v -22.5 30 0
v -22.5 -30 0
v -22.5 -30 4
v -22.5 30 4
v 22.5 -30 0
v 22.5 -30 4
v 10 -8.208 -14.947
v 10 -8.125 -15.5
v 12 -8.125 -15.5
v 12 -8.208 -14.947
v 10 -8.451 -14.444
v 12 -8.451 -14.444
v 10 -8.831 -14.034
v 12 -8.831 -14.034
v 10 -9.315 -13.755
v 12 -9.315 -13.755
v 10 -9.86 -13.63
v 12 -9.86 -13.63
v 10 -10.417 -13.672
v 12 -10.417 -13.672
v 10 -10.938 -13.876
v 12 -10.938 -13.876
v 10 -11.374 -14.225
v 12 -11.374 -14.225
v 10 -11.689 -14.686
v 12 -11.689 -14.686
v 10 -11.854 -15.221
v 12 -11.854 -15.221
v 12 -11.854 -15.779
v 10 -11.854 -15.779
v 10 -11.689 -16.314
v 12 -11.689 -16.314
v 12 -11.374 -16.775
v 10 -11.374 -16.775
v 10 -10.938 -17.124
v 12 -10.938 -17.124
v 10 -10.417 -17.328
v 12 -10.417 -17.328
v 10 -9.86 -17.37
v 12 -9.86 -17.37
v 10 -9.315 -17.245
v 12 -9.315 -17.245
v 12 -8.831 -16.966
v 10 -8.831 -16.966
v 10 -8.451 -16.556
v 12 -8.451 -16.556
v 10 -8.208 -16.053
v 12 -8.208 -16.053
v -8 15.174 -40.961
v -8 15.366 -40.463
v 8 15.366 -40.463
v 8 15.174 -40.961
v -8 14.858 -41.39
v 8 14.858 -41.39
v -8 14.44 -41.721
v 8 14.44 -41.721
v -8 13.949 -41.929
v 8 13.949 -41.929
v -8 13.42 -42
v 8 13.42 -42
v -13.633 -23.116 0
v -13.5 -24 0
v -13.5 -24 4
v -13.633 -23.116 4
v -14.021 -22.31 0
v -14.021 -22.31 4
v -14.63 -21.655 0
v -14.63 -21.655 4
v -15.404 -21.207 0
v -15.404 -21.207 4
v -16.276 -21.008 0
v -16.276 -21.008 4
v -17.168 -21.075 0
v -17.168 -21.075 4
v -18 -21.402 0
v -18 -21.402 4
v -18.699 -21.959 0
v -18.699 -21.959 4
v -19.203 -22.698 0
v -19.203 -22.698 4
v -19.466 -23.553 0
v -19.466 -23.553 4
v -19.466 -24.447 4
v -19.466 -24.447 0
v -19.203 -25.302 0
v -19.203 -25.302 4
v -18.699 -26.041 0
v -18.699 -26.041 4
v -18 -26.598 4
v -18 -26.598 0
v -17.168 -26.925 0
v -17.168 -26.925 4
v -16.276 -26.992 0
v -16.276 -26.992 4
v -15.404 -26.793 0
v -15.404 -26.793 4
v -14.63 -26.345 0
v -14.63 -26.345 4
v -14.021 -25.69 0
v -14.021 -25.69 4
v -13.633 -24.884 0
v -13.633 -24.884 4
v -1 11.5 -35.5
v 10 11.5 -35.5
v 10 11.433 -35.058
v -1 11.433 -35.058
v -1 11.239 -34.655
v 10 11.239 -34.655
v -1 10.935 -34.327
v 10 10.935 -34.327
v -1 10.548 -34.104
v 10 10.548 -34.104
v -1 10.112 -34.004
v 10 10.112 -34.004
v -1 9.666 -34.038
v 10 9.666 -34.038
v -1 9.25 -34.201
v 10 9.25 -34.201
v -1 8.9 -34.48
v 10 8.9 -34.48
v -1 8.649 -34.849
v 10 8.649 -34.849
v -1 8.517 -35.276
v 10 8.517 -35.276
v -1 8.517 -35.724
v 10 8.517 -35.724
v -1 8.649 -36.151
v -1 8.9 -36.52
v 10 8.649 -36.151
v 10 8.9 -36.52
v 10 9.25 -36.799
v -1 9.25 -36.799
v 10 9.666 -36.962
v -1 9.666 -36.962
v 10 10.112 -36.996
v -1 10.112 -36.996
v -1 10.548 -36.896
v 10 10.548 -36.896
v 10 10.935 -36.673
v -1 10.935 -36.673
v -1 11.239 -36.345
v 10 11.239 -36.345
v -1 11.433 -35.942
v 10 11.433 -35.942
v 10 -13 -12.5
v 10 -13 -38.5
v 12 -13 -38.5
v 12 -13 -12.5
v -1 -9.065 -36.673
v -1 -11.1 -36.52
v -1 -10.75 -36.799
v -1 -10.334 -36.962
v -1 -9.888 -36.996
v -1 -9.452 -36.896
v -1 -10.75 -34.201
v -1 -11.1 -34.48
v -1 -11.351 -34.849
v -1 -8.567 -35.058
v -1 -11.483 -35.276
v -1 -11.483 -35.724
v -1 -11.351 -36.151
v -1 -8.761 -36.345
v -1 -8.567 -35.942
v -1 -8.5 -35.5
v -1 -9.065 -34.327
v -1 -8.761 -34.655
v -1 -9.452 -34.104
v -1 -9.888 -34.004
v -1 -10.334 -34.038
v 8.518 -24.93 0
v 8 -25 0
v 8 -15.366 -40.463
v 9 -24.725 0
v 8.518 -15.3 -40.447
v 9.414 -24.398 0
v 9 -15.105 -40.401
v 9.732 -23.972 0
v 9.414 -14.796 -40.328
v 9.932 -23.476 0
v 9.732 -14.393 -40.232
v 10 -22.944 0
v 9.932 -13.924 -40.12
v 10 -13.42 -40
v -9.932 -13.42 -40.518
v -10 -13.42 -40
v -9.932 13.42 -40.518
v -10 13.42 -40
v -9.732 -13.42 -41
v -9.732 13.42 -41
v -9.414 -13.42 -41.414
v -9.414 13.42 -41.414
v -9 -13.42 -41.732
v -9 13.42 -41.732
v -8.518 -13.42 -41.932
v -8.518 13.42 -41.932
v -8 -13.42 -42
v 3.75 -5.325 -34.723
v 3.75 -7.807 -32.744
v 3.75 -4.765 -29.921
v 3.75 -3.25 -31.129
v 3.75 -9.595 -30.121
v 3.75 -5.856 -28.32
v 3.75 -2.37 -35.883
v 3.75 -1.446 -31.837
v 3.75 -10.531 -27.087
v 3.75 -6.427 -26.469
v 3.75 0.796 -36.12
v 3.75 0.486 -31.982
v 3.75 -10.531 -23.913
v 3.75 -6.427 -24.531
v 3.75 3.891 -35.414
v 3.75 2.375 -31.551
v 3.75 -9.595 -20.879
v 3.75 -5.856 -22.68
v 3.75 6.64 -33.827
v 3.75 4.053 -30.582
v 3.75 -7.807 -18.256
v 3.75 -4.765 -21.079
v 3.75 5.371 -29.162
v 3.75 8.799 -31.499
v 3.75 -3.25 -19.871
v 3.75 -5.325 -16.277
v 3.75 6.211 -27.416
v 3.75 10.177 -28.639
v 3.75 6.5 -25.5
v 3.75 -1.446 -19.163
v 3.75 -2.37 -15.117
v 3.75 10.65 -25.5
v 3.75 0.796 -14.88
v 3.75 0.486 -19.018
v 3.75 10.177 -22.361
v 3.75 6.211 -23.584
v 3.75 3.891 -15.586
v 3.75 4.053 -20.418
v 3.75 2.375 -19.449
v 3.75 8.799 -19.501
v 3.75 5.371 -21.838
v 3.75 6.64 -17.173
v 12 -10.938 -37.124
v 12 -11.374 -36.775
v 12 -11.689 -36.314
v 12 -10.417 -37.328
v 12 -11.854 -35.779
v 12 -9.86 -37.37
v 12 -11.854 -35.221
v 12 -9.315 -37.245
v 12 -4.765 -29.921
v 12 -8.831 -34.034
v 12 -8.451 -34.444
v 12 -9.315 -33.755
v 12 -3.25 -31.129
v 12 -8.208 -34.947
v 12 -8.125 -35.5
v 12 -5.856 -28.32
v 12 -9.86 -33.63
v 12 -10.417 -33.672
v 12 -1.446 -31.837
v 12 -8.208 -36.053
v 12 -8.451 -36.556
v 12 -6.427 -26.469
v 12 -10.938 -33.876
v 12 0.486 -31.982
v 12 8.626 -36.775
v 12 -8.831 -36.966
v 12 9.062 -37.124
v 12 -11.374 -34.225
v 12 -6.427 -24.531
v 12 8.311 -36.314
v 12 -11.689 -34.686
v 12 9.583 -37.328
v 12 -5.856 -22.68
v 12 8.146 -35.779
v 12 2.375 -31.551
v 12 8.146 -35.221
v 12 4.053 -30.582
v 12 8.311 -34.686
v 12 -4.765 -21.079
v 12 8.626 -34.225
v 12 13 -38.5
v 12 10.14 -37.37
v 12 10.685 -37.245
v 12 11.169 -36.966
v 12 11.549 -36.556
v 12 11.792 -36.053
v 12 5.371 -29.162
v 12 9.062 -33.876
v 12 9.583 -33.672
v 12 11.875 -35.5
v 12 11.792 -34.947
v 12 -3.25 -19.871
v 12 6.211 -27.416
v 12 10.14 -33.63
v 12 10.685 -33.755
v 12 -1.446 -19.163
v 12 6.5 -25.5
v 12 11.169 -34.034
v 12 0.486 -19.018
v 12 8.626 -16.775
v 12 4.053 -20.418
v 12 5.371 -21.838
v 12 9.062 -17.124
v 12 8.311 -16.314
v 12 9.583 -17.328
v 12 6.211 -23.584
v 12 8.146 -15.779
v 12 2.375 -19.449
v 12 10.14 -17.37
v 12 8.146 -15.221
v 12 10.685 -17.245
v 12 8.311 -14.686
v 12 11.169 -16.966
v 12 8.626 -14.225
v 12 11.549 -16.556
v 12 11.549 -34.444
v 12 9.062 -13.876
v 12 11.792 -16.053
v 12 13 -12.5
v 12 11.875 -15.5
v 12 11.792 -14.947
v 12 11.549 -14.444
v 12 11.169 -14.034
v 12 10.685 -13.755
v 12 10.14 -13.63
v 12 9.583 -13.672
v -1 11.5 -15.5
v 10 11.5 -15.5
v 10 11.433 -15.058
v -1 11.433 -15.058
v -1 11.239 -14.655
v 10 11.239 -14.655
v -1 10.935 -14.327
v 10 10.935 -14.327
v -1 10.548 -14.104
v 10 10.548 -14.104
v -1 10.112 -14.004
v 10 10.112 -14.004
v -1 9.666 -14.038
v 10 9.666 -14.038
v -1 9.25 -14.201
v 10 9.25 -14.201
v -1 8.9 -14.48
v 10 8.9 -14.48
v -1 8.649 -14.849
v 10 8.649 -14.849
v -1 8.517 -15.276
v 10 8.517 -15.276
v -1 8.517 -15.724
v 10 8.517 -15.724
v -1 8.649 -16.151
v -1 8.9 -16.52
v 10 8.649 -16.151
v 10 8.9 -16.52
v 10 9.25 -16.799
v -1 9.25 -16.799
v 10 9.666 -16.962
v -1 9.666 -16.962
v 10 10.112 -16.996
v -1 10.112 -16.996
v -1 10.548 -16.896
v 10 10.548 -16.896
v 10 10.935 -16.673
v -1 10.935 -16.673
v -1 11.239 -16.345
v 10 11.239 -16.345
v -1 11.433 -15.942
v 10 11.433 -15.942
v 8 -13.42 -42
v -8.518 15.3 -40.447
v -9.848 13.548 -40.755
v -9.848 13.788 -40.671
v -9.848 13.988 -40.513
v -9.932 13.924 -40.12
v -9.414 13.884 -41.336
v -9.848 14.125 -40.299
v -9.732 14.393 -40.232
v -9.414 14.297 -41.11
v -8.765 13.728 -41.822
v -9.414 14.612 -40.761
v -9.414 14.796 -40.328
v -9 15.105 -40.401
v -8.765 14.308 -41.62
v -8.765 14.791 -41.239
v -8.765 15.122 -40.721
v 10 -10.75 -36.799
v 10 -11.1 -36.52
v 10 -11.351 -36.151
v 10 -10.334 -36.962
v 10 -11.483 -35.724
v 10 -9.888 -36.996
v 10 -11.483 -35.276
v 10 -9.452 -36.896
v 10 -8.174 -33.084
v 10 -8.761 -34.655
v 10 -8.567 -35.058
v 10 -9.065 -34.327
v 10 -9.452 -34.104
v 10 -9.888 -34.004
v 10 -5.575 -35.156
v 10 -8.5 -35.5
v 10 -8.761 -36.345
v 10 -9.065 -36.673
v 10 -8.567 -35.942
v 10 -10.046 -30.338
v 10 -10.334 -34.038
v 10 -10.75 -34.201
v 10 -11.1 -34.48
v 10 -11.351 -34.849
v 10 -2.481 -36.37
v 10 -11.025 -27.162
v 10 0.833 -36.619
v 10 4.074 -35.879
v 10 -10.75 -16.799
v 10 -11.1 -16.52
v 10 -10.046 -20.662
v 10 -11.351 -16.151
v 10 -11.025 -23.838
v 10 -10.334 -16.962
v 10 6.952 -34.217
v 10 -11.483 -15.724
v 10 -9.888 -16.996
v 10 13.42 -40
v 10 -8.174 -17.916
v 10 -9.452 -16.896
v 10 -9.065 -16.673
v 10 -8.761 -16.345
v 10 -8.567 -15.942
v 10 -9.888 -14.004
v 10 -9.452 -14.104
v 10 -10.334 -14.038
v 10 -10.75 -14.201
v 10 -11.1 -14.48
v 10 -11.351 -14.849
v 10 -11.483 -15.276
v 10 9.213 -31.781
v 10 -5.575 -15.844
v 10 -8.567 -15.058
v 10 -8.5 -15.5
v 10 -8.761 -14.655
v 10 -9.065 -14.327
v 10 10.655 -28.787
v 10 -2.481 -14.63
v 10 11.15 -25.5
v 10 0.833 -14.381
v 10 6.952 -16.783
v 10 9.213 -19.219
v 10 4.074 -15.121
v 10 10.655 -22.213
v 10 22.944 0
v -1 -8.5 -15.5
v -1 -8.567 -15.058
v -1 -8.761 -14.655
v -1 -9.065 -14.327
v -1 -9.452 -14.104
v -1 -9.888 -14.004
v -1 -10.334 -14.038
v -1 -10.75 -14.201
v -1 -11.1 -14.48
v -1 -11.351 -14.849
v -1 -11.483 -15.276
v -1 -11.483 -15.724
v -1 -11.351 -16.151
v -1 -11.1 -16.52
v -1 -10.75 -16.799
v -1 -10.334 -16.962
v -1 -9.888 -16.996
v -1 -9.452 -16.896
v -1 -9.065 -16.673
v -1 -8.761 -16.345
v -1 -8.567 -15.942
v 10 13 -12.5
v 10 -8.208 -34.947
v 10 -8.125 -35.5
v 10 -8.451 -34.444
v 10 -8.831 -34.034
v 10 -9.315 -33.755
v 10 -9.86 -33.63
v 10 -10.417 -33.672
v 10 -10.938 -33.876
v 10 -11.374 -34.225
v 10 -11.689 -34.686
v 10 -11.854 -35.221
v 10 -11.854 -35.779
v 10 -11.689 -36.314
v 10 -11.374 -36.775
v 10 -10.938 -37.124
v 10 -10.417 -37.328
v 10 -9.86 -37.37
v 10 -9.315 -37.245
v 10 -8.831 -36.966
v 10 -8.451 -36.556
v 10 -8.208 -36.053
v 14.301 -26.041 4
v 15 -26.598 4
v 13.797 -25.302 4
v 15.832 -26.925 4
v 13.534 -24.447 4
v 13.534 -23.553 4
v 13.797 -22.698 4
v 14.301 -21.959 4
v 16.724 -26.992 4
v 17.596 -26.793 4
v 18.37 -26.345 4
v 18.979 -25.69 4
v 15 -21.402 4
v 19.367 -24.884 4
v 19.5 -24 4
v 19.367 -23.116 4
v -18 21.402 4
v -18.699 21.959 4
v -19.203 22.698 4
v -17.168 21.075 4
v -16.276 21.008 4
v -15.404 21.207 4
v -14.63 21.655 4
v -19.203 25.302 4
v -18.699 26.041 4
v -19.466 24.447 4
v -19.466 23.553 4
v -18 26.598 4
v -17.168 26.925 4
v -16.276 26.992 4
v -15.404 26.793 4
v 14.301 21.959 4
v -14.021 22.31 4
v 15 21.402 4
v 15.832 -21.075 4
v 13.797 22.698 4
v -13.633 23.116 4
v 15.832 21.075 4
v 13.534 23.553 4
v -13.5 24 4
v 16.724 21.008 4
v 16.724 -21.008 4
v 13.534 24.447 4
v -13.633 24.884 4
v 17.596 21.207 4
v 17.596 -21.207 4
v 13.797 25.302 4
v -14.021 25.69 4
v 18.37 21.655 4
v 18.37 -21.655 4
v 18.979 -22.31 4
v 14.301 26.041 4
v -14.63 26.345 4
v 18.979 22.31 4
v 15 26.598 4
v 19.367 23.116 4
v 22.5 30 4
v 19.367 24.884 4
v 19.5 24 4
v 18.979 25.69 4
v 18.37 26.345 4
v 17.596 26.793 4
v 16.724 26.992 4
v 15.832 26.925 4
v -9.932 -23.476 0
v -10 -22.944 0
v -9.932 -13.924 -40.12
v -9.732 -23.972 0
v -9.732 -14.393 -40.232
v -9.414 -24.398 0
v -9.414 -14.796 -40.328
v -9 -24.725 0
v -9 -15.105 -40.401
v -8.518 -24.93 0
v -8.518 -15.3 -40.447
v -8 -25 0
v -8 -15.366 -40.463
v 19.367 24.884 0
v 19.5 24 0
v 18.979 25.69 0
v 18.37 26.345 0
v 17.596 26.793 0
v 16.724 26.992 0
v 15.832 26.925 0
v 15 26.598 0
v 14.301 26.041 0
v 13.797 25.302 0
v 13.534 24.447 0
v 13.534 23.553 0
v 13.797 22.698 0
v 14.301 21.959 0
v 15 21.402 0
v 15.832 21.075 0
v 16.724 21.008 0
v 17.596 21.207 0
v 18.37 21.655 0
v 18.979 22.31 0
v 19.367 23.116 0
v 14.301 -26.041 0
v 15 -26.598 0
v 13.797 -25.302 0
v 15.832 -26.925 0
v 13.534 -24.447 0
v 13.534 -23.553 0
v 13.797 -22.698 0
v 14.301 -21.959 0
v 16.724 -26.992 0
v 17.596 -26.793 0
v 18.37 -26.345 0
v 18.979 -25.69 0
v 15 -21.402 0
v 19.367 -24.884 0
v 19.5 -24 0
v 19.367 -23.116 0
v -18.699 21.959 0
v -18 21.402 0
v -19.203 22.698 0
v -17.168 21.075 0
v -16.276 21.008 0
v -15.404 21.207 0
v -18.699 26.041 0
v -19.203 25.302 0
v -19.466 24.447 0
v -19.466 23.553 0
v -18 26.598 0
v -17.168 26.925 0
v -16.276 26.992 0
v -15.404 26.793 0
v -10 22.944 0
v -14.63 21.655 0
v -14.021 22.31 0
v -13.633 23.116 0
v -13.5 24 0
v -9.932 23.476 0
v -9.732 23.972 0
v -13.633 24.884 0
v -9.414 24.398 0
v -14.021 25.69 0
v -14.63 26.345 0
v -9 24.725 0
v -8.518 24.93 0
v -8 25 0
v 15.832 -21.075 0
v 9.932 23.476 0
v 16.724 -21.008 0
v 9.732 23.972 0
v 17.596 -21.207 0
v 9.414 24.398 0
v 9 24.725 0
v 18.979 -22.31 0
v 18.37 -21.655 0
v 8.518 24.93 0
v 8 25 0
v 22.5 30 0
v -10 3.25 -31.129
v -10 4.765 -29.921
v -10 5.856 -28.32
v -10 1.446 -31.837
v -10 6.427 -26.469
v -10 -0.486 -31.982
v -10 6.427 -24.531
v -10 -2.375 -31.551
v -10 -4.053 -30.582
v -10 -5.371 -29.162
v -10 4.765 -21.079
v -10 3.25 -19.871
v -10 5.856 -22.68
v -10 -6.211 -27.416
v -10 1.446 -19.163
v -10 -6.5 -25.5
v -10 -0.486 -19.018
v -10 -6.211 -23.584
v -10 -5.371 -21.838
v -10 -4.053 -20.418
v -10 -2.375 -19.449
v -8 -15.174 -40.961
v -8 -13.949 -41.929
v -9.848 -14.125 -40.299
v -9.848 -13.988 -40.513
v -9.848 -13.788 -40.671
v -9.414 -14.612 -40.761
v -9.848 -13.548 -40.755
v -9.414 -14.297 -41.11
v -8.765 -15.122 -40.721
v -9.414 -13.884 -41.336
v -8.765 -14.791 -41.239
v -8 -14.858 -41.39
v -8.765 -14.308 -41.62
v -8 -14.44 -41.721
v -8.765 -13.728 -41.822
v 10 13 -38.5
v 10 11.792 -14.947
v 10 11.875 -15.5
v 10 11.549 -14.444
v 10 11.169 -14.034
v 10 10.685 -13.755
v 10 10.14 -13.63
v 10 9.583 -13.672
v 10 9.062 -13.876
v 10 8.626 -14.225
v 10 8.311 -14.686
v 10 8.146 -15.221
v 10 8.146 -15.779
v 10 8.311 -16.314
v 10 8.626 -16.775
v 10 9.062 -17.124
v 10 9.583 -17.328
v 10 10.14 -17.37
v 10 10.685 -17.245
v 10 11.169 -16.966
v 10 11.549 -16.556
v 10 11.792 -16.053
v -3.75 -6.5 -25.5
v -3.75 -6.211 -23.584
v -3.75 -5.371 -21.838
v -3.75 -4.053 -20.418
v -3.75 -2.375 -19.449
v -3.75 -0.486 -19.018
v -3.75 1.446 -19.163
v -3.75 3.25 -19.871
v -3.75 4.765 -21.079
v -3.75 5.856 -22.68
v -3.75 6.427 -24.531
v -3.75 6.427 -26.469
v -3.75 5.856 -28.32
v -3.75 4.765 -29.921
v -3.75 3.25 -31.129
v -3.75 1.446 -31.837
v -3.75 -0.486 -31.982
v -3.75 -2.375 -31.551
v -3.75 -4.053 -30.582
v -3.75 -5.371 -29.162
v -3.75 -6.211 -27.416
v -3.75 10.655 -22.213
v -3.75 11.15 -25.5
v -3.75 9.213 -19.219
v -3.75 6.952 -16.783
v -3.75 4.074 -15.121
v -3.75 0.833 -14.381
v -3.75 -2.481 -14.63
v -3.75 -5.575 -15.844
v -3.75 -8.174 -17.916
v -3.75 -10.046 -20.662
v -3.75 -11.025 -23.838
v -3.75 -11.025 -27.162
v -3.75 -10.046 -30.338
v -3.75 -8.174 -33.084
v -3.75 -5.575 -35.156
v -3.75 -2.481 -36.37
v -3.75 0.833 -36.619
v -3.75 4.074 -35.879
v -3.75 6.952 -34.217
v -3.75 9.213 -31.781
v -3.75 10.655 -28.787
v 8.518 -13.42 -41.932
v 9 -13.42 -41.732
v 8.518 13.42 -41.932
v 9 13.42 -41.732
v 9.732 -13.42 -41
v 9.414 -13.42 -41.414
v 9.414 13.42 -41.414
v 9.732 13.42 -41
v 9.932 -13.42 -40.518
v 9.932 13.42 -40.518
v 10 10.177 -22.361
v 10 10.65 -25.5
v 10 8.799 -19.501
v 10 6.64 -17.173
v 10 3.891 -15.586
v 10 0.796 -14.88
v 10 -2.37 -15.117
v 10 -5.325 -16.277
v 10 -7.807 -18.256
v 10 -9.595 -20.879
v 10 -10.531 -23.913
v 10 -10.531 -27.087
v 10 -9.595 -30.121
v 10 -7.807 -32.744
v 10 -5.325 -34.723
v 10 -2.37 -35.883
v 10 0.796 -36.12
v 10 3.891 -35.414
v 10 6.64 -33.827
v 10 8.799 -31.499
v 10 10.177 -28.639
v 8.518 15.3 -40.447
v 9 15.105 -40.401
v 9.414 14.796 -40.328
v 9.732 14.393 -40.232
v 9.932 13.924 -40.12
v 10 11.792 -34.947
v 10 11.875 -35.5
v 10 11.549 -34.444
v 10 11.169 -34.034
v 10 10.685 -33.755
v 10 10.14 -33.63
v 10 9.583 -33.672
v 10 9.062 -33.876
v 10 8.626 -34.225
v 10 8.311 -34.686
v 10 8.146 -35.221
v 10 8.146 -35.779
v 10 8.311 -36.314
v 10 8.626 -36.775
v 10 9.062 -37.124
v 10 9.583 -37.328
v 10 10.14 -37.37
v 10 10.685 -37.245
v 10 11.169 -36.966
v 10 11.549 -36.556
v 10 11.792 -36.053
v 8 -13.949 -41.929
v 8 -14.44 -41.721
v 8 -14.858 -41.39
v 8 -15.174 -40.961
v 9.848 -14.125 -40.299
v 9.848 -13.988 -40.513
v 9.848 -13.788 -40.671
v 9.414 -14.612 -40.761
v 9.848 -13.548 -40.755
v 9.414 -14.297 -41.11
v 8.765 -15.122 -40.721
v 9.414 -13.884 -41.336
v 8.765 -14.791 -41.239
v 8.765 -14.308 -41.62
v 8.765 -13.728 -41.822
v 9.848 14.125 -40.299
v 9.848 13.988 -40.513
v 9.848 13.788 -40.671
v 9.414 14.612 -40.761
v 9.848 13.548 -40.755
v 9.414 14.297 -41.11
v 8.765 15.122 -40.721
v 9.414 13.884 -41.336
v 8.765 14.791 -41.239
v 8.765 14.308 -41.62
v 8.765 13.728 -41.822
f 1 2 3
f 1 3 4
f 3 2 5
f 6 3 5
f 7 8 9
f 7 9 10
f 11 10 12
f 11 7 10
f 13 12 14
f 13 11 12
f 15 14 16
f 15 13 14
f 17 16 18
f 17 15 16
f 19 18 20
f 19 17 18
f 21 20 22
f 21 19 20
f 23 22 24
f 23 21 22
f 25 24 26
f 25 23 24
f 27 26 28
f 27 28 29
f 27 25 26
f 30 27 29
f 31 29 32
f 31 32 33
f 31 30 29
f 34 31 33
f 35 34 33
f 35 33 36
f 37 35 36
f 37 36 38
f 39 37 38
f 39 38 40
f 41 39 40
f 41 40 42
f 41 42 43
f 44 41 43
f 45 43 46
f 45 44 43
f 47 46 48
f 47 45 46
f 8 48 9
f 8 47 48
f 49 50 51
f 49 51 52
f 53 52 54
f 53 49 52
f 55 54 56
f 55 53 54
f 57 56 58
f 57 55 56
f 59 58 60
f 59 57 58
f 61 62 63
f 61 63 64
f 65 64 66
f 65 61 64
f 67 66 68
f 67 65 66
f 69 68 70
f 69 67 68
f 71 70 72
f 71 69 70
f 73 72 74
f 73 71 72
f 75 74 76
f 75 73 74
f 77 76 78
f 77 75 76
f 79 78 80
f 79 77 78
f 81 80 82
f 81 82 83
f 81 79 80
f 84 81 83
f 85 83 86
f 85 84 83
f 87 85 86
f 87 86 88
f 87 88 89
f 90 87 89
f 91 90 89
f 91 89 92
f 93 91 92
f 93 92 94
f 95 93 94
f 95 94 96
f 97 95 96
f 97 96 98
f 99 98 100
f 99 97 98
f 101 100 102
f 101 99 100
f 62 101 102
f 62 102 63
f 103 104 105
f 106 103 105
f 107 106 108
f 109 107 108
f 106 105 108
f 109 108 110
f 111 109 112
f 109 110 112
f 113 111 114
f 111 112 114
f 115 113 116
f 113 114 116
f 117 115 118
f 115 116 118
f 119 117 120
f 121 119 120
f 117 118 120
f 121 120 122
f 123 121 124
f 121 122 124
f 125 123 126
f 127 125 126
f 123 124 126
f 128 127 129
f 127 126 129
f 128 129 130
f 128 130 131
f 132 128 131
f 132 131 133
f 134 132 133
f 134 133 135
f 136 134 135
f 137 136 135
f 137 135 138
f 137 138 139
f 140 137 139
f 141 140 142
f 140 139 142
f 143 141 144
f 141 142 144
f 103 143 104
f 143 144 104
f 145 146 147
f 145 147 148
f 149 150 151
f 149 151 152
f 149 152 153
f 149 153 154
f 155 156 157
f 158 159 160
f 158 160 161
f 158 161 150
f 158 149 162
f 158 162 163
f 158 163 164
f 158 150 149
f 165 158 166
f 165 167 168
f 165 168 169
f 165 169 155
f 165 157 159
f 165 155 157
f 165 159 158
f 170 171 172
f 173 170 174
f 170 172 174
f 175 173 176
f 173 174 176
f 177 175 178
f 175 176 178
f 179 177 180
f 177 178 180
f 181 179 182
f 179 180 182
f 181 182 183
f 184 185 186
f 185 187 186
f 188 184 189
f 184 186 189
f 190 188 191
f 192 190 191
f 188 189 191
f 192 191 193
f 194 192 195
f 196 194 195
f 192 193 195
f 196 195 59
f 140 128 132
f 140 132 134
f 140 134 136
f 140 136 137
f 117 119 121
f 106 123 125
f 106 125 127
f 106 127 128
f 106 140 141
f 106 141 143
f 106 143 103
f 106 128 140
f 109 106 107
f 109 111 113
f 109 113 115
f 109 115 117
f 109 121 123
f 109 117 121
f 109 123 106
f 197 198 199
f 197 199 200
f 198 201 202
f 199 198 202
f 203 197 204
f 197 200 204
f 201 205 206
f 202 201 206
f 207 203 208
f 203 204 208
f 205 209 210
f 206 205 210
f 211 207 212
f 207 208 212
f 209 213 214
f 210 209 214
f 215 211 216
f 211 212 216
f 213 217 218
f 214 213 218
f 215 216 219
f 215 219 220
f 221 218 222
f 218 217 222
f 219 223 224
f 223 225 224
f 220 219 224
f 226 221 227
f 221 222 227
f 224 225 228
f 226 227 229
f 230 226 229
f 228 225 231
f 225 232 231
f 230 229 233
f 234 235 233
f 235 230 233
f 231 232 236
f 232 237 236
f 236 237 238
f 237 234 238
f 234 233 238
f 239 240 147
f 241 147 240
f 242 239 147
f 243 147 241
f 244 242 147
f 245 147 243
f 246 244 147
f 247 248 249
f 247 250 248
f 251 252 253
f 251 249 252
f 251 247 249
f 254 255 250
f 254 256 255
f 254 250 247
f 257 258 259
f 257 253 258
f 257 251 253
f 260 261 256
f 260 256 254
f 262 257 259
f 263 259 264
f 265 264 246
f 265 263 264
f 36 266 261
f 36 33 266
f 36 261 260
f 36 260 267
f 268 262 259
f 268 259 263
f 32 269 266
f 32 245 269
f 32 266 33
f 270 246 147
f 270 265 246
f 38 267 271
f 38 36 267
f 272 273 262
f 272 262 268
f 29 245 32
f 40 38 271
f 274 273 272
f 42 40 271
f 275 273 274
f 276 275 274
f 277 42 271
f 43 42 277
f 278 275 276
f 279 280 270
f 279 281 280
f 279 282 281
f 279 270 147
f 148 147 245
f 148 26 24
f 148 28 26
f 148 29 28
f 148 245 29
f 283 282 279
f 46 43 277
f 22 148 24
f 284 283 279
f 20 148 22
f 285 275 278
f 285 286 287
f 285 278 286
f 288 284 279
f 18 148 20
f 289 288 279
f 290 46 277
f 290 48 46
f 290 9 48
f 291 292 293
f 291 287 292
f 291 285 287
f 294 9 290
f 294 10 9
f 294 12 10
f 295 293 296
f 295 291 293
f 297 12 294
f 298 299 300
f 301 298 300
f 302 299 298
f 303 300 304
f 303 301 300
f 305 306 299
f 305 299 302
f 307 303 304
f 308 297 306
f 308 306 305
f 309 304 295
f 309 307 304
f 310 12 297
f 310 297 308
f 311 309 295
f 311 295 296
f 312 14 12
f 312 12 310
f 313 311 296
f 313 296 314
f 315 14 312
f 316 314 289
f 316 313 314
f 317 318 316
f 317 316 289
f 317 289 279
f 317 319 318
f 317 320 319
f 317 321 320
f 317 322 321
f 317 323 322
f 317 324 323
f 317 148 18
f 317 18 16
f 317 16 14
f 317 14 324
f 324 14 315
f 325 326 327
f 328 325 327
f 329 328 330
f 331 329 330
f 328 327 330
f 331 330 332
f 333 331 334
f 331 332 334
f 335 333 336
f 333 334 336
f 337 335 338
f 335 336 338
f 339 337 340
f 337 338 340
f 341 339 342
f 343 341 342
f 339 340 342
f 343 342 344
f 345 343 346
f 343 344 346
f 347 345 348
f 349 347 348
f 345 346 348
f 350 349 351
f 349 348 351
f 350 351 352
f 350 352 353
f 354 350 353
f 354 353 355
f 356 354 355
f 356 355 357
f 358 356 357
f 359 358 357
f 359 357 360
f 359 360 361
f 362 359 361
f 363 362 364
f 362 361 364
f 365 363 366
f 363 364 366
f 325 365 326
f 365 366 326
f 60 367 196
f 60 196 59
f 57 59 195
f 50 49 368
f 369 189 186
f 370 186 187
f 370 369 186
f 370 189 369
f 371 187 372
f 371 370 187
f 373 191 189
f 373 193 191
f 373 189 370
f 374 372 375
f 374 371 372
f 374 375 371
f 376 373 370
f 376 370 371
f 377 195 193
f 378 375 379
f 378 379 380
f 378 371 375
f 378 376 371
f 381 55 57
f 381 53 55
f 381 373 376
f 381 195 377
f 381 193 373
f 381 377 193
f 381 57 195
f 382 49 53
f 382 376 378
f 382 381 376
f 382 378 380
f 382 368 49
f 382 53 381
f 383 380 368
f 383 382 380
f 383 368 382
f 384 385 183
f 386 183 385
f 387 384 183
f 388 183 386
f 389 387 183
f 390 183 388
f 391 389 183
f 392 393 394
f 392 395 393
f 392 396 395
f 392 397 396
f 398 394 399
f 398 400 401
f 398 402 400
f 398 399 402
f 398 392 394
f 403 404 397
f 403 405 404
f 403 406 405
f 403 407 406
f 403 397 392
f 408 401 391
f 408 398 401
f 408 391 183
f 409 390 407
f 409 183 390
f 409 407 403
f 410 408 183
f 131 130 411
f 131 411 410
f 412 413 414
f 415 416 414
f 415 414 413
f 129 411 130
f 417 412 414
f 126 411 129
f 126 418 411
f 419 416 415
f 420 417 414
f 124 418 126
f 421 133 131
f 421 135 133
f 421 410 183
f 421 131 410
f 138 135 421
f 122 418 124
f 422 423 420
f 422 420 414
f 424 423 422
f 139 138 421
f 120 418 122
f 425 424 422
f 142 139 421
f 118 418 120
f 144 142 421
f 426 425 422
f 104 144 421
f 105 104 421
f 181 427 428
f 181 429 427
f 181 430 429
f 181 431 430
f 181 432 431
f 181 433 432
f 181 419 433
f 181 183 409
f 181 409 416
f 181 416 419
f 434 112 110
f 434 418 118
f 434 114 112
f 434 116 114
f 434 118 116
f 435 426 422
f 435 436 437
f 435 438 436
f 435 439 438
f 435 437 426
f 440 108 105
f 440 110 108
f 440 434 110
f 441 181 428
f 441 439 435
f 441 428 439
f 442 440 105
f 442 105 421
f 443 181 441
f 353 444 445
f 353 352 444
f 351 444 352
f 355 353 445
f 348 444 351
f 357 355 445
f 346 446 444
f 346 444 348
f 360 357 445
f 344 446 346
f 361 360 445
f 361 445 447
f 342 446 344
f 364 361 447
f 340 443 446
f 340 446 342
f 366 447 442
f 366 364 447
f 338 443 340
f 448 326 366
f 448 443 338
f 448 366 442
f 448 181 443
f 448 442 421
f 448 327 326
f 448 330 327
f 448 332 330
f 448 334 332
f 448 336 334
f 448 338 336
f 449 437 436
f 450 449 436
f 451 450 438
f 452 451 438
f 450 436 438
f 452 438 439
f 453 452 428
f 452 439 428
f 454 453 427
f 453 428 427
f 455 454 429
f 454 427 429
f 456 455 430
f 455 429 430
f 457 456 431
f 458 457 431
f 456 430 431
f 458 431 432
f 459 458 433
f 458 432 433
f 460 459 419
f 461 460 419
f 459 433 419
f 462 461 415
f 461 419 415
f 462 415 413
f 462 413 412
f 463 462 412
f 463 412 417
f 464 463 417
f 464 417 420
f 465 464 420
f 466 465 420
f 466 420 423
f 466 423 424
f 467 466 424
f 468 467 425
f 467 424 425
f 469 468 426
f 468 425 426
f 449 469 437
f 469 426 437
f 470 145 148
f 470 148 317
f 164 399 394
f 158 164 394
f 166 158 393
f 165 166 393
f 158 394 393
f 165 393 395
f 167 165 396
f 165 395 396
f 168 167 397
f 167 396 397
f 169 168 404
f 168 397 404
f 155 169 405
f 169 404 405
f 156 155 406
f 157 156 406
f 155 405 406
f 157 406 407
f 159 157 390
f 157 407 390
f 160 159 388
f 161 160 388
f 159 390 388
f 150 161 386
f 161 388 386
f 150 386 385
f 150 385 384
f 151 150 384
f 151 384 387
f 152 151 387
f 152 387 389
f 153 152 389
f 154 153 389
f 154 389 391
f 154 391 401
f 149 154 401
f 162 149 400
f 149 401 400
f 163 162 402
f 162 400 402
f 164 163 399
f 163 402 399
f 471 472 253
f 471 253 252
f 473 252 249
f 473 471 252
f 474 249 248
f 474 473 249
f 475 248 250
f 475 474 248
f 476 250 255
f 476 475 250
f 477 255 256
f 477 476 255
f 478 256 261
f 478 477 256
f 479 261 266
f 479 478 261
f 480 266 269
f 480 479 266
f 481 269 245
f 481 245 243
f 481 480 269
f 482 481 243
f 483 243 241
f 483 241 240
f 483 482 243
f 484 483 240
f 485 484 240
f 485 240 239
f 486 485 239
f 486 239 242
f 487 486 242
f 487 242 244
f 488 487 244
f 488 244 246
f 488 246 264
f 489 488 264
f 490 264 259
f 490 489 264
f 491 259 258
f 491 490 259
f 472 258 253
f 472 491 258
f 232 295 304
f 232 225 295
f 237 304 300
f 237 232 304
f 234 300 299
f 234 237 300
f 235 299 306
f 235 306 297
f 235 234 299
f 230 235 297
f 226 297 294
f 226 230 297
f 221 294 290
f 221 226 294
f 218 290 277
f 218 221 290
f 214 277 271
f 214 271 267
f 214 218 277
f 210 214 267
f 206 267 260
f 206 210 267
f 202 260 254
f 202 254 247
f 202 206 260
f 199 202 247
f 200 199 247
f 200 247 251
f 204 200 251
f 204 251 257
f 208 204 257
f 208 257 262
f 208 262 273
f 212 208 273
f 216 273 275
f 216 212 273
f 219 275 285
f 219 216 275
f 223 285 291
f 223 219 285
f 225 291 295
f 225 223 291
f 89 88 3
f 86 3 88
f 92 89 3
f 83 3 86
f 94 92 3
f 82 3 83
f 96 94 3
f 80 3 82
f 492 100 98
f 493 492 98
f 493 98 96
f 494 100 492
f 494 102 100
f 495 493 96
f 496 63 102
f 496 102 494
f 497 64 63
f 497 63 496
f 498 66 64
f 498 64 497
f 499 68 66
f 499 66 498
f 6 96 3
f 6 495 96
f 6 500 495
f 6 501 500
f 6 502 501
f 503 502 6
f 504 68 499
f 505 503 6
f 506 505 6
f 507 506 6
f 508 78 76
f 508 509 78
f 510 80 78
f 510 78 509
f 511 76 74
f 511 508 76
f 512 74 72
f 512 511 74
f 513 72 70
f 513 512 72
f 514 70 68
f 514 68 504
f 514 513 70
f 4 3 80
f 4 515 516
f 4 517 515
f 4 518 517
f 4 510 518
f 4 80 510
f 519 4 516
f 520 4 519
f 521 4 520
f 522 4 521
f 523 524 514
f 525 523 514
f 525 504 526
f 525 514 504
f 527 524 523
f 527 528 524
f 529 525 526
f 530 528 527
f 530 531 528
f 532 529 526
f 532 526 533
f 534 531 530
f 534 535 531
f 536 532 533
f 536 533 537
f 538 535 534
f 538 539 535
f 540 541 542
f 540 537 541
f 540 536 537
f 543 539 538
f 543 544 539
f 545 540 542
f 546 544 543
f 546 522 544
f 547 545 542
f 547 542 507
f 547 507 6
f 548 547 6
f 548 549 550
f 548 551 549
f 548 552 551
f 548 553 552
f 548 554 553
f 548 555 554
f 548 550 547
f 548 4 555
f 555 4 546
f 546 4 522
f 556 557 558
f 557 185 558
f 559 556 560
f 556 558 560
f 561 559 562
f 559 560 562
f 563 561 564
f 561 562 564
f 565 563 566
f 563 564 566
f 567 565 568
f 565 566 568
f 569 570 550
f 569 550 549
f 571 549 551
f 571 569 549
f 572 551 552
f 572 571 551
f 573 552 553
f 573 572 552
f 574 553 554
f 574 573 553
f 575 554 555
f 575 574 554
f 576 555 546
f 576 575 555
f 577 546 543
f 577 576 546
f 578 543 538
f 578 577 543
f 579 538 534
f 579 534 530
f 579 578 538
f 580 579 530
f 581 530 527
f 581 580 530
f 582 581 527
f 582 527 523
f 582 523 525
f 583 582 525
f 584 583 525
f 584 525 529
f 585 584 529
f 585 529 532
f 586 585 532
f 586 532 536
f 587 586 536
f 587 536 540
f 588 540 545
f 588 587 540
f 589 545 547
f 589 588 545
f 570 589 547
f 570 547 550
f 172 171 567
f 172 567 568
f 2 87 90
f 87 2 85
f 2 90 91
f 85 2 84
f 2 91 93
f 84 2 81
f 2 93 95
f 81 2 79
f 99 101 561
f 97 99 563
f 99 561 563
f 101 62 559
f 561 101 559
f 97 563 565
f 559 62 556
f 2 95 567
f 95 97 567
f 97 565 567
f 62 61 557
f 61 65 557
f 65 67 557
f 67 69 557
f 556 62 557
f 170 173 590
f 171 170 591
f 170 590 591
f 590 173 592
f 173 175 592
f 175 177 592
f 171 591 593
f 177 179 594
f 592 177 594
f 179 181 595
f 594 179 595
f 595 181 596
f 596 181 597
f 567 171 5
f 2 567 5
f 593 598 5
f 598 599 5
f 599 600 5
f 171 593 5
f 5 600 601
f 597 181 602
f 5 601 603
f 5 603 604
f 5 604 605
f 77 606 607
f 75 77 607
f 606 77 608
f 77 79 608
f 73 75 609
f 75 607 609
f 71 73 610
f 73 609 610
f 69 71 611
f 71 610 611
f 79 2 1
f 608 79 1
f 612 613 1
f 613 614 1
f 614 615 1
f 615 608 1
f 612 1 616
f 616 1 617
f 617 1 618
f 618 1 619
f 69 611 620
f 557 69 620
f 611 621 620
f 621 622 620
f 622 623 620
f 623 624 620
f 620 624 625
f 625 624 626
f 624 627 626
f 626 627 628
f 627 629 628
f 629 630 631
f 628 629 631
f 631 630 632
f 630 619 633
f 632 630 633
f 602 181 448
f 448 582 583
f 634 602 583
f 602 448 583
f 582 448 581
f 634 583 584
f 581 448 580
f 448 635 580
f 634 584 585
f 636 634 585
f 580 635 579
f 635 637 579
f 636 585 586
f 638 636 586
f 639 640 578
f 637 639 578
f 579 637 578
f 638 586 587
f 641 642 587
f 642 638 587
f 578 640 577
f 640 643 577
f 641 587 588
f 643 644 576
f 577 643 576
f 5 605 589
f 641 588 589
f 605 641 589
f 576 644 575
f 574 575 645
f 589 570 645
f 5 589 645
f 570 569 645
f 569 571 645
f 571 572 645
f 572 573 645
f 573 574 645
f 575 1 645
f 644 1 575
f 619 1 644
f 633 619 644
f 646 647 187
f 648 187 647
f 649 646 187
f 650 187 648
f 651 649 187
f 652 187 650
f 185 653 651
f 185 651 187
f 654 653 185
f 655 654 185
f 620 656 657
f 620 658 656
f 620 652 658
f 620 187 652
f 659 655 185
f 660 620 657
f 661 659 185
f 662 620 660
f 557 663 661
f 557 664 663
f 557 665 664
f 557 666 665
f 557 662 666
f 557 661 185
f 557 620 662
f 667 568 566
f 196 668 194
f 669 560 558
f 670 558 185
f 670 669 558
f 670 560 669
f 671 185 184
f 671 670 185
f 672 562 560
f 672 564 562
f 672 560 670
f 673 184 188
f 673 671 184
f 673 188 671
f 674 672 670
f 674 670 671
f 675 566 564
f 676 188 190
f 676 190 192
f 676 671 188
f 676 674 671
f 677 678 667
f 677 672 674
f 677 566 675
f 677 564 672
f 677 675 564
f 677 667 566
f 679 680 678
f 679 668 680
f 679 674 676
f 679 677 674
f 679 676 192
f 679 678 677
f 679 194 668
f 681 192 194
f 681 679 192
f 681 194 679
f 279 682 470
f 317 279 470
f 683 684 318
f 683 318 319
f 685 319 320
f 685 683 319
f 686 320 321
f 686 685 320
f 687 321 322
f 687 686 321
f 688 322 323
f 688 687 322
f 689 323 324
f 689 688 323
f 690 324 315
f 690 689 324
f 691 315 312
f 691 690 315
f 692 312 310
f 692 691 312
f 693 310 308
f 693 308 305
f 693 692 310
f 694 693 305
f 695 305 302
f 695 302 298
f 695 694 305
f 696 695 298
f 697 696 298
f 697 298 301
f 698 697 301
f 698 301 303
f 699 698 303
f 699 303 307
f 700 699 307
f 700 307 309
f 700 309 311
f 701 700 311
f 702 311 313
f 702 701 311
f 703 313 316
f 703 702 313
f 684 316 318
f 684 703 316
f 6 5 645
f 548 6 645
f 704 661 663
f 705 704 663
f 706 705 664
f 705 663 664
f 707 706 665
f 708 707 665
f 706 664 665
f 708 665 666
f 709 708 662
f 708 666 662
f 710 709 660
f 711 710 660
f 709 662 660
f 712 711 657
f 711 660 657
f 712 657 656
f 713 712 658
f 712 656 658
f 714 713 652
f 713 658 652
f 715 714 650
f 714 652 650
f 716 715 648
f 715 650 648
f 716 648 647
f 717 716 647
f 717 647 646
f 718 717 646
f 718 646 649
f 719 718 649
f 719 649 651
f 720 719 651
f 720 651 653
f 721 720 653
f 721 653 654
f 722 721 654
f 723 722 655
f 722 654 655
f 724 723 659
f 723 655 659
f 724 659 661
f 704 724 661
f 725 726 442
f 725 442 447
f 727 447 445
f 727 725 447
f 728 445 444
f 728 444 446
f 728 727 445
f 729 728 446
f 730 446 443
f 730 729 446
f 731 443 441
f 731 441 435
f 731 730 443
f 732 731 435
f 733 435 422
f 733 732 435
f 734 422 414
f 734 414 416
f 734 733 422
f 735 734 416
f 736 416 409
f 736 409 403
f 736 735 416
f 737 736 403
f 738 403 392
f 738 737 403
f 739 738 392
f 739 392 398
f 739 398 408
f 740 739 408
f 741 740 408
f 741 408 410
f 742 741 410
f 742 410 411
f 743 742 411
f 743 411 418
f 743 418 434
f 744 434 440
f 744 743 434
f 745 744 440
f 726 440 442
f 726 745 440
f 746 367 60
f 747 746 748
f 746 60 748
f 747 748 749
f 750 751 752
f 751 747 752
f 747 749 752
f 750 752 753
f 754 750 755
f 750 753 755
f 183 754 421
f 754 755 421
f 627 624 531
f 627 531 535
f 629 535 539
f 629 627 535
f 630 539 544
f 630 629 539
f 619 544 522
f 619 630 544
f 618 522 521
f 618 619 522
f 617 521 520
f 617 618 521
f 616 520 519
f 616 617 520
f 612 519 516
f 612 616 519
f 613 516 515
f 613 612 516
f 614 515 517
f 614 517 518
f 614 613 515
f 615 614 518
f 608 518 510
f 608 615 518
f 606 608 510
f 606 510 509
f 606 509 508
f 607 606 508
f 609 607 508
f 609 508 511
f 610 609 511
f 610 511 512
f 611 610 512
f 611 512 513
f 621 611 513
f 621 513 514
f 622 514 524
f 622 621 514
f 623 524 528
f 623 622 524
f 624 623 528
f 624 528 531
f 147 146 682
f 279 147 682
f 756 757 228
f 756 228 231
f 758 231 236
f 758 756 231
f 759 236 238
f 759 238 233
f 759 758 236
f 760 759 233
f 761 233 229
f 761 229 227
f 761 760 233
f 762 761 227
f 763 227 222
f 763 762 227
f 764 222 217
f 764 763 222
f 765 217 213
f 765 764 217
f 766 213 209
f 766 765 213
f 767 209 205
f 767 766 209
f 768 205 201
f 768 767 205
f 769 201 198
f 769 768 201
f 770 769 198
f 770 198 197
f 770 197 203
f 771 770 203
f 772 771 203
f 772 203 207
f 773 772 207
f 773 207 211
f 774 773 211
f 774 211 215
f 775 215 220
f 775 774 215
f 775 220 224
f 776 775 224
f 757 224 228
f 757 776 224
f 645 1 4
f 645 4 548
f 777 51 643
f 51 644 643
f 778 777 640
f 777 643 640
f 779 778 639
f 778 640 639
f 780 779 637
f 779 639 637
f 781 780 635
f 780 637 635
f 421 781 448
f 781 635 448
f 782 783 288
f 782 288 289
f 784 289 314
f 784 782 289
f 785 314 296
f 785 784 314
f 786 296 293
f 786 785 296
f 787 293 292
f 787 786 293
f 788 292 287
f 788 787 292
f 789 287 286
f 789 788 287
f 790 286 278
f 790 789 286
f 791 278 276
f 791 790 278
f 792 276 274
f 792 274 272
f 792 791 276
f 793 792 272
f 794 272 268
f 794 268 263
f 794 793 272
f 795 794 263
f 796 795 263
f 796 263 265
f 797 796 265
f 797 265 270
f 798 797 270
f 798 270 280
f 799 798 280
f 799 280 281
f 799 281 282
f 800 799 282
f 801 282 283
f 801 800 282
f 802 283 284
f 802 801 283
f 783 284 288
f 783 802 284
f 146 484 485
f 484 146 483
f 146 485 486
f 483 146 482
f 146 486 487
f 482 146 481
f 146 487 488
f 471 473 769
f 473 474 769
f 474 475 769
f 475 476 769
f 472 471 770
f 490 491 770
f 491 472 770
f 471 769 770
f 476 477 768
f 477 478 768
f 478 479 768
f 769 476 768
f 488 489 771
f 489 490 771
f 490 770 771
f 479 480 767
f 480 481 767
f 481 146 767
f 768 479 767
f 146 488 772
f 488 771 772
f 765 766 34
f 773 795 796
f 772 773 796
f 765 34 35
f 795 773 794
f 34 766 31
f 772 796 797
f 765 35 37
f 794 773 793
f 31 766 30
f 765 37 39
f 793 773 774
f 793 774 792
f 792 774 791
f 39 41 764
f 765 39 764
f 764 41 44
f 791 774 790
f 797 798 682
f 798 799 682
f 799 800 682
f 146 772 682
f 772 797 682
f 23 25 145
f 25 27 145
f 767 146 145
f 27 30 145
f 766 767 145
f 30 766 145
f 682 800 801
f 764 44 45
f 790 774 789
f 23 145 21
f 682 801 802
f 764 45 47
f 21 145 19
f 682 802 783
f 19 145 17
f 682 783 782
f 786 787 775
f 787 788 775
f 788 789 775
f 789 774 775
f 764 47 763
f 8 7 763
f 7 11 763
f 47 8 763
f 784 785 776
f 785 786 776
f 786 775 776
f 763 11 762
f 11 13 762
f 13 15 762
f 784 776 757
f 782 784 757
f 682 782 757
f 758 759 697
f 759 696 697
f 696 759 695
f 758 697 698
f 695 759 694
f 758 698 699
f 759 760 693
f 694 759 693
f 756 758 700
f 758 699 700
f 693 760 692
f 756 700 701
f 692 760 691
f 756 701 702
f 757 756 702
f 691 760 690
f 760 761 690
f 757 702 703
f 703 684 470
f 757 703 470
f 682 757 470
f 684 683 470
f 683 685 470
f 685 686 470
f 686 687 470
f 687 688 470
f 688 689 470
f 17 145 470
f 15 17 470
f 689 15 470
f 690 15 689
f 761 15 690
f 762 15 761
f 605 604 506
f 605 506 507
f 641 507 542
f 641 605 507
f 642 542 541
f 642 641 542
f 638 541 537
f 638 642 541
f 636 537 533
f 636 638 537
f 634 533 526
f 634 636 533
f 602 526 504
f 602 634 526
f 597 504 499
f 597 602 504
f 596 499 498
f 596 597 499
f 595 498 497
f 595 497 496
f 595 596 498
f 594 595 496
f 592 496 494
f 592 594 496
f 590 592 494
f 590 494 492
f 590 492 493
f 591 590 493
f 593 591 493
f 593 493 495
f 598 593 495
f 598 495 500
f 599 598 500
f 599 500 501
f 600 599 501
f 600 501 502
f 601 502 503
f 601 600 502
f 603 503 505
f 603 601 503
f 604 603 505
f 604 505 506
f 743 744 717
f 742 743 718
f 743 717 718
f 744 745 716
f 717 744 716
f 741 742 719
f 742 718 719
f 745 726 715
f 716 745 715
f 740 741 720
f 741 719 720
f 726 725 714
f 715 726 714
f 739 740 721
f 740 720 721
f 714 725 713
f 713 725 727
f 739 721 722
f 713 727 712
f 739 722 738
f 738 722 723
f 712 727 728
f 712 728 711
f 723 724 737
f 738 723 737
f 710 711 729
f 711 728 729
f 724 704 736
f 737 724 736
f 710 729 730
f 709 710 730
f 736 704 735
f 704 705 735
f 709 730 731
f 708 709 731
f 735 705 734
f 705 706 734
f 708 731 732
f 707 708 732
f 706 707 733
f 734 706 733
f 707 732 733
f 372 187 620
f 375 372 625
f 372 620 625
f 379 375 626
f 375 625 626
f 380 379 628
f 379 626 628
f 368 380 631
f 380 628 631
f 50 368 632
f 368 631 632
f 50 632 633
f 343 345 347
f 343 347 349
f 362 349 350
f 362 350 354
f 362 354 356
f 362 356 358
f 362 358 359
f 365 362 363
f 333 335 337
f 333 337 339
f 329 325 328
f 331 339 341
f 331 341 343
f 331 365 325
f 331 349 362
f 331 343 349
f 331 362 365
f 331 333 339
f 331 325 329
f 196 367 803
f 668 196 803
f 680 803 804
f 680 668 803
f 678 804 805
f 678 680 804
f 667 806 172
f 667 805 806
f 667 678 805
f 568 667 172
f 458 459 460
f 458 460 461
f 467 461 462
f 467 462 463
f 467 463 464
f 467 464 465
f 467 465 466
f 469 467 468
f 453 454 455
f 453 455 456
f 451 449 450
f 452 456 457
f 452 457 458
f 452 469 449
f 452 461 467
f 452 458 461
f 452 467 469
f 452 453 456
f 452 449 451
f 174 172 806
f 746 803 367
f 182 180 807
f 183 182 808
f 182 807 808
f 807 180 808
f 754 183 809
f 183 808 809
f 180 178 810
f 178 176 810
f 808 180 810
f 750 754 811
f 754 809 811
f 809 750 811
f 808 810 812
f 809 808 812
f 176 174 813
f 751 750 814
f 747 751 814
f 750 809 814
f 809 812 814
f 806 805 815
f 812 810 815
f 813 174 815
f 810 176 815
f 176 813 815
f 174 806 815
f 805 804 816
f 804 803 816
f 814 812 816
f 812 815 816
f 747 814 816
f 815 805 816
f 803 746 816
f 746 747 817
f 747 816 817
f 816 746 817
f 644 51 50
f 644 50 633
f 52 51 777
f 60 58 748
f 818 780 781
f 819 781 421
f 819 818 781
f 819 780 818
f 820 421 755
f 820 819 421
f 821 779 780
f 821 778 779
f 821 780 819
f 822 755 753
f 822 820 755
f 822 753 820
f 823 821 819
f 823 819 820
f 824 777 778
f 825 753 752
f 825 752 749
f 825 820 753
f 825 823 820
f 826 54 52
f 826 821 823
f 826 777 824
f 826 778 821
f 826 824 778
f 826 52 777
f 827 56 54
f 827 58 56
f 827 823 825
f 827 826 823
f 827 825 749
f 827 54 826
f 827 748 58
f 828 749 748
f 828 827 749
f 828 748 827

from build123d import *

# Parameters (mm, degrees)
F0_W      = 45
F0_H      = 60
F0_R      = 3
F1_DEPTH  = 4
F2_R      = 11.15
F3_DEPTH  = 10
F4_R      = 11.15
F4_R_2    = 6.5
F5_DEPTH  = 6.25
F6_R      = 10.65
F6_R_2    = 6.5
F7_DEPTH  = 6.25
F6_W      = 26
F6_H      = 26
F6_R_3    = 1.875
F6_R_4    = 11.15
F8_DEPTH  = 2
F9_R      = 1.5
F10_DEPTH = 11
F11_R     = 2


with BuildPart() as f1:
    # F0 (on Top) → F1 (new body)
    with BuildSketch(Plane.XY):
        Rectangle(F0_W, F0_H)
        with Locations((-16.5, -24)):
            Circle(F0_R, mode=Mode.SUBTRACT)
        with Locations((16.5, -24)):
            Circle(F0_R, mode=Mode.SUBTRACT)
        with Locations((-16.5, 24)):
            Circle(F0_R, mode=Mode.SUBTRACT)
        with Locations((16.5, 24)):
            Circle(F0_R, mode=Mode.SUBTRACT)
    extrude(amount=F1_DEPTH)

    # F2 (on Right) → F3 (join, symmetric)
    with BuildSketch(Plane.YZ):
        Polygon((15, -42), (25, 0), (-25, 0), (-15, -42), align=None)
        with Locations((0, -25.5)):
            Circle(F2_R, mode=Mode.SUBTRACT)
    extrude(amount=F3_DEPTH, both=True)

    # F4 (on face) → F5 (join)
    with BuildSketch(Plane(origin=(-10, 0, 0), x_dir=(0, -1, 0), z_dir=(-1, 0, 0))):
        with Locations((0, -25.5)):
            Circle(F4_R)
        with Locations((0, -25.5)):
            Circle(F4_R_2, mode=Mode.SUBTRACT)
    extrude(amount=-F5_DEPTH)

    # F9 (on face) → F10 (cut)
    with BuildSketch(Plane.YZ.offset(10)):
        with Locations((-10, -15.5)):
            Circle(F9_R)
        with Locations((10, -15.5)):
            Circle(F9_R)
        with Locations((10, -35.5)):
            Circle(F9_R)
        with Locations((-10, -35.5)):
            Circle(F9_R)
    extrude(amount=-F10_DEPTH, mode=Mode.SUBTRACT)

    # F11
    f11_edges = [f1.edges().sort_by_distance(p)[0] for p in [
        (10, 0, -42),
        (0, 15, -42),
        (-10, 0, -42),
        (0, -15, -42),
        (10, 20, -21),
        (-10, 20, -21),
        (10, -20, -21),
        (-10, -20, -21),
    ]]
    fillet(f11_edges, radius=F11_R)


with BuildPart() as f7:
    # F6 (on face) → F7 (new body)
    with BuildSketch(Plane.YZ.offset(10)):
        with Locations((0, -25.5)):
            Circle(F6_R)
        with Locations((0, -25.5)):
            Circle(F6_R_2, mode=Mode.SUBTRACT)
    extrude(amount=-F7_DEPTH)

    # F6 (on face) → F8 (join)
    with BuildSketch(Plane.YZ.offset(10)):
        with Locations((0, -25.5)):
            Rectangle(F6_W, F6_H)
        with Locations((-10, -35.5)):
            Circle(F6_R_3, mode=Mode.SUBTRACT)
        with Locations((10, -35.5)):
            Circle(F6_R_3, mode=Mode.SUBTRACT)
        with Locations((0, -25.5)):
            Circle(F6_R_4, mode=Mode.SUBTRACT)
        with Locations((-10, -15.5)):
            Circle(F6_R_3, mode=Mode.SUBTRACT)
        with Locations((10, -15.5)):
            Circle(F6_R_3, mode=Mode.SUBTRACT)
        with Locations((0, -25.5)):
            Circle(F6_R_4)
        with Locations((0, -25.5)):
            Circle(F6_R, mode=Mode.SUBTRACT)
        with Locations((0, -25.5)):
            Circle(F6_R)
        with Locations((0, -25.5)):
            Circle(F6_R_2, mode=Mode.SUBTRACT)
    extrude(amount=F8_DEPTH)


solid = Compound([f1.part, f7.part])
